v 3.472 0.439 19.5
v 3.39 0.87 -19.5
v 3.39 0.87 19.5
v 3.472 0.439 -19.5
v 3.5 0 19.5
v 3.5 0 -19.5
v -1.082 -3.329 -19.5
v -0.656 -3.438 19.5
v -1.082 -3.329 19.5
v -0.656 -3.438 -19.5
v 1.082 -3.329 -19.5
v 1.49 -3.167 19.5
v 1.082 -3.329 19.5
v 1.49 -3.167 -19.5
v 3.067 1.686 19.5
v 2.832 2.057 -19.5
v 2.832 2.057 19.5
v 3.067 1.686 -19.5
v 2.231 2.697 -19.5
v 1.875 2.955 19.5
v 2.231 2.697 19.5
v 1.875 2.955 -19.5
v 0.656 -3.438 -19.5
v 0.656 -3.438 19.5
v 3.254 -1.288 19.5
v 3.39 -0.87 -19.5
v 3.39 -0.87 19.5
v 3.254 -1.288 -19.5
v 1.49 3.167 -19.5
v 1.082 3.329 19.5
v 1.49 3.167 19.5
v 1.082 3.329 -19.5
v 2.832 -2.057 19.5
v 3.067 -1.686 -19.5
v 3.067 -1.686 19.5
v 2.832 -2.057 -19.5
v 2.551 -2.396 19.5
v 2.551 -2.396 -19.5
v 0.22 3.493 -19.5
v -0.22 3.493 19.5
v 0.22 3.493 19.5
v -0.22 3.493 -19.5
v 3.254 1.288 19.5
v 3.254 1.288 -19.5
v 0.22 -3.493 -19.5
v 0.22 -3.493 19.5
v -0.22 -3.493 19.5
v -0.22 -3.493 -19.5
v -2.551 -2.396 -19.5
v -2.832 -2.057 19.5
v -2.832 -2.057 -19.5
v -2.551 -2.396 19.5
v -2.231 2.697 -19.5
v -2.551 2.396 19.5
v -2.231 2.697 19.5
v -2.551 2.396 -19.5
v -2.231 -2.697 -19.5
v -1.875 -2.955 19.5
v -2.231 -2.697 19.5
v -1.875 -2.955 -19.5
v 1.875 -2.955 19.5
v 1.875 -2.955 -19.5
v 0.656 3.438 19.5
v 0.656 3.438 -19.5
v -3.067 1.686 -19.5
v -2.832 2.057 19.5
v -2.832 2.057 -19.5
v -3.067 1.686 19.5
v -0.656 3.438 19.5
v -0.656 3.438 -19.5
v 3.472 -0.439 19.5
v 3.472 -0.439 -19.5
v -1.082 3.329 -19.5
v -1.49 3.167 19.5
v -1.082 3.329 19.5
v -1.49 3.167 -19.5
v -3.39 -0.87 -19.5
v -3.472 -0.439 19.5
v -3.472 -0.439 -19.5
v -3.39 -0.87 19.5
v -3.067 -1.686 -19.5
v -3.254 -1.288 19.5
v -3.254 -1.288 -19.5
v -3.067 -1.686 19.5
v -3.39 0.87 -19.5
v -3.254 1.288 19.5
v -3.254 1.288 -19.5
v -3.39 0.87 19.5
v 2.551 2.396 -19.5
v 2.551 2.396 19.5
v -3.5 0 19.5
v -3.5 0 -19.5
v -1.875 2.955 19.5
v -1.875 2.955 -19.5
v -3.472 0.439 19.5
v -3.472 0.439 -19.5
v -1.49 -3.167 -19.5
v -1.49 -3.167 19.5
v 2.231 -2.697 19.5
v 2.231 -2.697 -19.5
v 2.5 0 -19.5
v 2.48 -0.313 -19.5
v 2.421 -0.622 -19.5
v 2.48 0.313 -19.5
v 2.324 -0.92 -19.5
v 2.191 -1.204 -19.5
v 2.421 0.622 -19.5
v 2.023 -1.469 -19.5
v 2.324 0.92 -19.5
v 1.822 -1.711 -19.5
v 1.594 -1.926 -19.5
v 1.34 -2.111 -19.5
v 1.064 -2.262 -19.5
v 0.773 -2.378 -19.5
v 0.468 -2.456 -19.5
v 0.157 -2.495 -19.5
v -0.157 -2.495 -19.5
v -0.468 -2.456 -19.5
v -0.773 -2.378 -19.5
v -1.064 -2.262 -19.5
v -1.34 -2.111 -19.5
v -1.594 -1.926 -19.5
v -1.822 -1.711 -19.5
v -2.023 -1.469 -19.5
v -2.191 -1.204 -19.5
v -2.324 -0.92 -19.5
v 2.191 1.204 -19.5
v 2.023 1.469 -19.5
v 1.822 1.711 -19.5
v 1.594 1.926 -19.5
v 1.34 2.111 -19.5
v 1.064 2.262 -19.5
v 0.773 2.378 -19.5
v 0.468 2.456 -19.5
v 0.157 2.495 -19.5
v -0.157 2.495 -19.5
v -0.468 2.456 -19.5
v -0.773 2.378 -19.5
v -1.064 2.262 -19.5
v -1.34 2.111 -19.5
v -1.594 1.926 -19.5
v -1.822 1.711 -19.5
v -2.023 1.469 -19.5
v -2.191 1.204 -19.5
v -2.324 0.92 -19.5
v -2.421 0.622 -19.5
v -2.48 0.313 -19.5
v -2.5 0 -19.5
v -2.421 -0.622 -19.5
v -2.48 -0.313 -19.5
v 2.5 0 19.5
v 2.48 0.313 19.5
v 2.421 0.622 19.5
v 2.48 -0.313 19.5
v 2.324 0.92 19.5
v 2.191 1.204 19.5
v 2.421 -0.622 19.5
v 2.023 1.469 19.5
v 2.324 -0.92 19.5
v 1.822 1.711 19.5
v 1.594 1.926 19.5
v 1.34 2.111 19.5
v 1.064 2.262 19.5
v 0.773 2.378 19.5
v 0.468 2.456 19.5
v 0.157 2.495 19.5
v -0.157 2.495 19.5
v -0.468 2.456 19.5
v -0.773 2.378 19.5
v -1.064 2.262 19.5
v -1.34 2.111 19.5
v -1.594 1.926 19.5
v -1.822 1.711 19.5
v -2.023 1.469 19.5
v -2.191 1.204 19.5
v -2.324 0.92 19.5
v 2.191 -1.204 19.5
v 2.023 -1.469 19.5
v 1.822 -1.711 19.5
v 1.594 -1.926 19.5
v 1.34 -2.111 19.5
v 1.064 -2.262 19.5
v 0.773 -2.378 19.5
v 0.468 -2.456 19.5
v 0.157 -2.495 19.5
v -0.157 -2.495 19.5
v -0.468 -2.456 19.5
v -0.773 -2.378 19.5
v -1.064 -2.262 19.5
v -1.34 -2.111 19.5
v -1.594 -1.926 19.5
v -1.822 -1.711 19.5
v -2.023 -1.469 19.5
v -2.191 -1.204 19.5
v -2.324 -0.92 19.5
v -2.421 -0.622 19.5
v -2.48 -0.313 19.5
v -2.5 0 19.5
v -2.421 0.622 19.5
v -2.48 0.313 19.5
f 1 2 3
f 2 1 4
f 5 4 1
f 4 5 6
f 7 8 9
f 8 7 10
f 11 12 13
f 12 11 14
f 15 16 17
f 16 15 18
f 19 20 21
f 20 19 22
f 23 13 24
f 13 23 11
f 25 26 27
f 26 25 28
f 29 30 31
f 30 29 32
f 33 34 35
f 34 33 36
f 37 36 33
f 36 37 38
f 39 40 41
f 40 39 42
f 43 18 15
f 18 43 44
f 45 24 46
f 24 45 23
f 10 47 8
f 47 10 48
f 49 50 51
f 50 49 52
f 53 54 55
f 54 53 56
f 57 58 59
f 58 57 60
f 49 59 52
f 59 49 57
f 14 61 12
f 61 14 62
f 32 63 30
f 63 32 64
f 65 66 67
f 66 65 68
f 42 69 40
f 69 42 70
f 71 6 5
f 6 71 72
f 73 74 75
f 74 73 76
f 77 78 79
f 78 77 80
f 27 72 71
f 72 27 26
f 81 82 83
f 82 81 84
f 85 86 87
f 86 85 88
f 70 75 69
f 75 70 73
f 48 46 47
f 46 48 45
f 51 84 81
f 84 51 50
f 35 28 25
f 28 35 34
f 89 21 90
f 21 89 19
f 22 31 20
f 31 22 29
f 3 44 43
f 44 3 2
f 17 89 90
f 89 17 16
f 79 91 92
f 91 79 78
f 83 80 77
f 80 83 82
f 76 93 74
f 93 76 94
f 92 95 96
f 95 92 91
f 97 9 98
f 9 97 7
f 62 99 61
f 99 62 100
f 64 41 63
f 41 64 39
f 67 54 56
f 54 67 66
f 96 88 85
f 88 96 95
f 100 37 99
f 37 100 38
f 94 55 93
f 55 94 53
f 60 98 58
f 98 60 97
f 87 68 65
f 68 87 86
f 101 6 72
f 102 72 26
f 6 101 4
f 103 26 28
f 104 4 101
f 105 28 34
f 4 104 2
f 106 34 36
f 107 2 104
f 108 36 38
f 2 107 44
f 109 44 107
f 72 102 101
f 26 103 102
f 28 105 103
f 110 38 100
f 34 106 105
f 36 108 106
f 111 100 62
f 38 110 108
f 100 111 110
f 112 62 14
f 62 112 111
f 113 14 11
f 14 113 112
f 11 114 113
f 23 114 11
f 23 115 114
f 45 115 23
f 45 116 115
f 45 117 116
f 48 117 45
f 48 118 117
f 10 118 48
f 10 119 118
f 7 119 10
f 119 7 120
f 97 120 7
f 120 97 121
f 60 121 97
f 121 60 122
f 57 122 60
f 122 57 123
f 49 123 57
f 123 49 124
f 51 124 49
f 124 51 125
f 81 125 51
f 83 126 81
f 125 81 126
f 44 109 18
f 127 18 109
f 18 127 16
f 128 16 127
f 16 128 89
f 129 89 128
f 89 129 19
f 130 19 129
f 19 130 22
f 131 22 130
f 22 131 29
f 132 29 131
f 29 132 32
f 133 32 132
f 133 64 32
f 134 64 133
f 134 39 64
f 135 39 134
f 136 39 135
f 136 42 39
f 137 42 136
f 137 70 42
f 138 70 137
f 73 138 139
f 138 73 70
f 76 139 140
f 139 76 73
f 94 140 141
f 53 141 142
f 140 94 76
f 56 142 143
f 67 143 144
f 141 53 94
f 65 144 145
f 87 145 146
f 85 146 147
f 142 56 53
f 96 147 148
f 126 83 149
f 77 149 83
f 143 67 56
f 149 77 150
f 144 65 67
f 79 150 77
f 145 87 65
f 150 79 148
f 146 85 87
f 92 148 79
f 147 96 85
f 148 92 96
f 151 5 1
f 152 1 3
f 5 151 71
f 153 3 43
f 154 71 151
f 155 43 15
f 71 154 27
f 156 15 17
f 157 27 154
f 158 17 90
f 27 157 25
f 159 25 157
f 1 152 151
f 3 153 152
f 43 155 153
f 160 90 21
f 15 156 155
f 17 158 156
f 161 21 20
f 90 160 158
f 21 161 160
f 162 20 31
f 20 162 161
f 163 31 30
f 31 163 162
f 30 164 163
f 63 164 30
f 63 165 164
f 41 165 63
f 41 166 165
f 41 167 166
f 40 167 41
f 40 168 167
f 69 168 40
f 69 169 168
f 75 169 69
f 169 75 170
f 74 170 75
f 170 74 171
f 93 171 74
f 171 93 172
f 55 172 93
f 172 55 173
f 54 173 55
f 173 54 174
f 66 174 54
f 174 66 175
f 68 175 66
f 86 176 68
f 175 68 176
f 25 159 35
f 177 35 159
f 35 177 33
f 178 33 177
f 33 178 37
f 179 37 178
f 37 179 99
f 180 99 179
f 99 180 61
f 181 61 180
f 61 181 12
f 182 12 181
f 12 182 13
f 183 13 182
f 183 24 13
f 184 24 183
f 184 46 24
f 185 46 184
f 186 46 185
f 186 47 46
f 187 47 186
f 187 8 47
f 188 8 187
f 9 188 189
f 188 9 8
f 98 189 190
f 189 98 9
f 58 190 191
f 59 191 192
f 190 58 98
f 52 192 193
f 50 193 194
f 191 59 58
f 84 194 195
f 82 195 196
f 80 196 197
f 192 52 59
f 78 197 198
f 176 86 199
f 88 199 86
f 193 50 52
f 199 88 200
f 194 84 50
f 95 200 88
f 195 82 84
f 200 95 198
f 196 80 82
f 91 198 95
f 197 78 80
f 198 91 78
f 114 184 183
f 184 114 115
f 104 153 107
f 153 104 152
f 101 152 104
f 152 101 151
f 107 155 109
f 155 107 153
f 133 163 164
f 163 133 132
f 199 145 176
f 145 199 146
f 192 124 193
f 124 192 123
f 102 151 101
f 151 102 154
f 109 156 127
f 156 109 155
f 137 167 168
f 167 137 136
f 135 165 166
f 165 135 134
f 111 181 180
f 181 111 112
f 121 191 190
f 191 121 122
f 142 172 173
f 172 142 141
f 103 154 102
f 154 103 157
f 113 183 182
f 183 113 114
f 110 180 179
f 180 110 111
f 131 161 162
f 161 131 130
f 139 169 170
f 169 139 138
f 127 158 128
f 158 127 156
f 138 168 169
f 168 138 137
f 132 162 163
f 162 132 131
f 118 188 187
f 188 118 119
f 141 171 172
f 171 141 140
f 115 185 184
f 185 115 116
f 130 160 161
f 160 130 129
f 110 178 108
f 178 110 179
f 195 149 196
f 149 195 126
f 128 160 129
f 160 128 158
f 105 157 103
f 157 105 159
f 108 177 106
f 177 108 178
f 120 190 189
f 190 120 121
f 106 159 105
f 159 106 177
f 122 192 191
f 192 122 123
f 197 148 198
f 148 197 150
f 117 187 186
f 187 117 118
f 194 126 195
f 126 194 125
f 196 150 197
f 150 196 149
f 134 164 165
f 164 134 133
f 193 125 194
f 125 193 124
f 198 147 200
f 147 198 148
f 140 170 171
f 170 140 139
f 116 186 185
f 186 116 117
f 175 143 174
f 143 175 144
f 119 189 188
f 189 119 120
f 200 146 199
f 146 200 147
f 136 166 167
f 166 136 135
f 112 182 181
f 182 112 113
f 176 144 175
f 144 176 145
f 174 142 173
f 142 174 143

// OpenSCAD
$fn = 50;


difference() {
	union() {
		translate(v = [0, 0, -19.5000000000]) {
			cylinder(h = 39, r = 3.5000000000);
		}
	}
	union() {
		translate(v = [0, 0, -100.0000000000]) {
			cylinder(h = 200, r = 2.5000000000);
		}
	}
}
